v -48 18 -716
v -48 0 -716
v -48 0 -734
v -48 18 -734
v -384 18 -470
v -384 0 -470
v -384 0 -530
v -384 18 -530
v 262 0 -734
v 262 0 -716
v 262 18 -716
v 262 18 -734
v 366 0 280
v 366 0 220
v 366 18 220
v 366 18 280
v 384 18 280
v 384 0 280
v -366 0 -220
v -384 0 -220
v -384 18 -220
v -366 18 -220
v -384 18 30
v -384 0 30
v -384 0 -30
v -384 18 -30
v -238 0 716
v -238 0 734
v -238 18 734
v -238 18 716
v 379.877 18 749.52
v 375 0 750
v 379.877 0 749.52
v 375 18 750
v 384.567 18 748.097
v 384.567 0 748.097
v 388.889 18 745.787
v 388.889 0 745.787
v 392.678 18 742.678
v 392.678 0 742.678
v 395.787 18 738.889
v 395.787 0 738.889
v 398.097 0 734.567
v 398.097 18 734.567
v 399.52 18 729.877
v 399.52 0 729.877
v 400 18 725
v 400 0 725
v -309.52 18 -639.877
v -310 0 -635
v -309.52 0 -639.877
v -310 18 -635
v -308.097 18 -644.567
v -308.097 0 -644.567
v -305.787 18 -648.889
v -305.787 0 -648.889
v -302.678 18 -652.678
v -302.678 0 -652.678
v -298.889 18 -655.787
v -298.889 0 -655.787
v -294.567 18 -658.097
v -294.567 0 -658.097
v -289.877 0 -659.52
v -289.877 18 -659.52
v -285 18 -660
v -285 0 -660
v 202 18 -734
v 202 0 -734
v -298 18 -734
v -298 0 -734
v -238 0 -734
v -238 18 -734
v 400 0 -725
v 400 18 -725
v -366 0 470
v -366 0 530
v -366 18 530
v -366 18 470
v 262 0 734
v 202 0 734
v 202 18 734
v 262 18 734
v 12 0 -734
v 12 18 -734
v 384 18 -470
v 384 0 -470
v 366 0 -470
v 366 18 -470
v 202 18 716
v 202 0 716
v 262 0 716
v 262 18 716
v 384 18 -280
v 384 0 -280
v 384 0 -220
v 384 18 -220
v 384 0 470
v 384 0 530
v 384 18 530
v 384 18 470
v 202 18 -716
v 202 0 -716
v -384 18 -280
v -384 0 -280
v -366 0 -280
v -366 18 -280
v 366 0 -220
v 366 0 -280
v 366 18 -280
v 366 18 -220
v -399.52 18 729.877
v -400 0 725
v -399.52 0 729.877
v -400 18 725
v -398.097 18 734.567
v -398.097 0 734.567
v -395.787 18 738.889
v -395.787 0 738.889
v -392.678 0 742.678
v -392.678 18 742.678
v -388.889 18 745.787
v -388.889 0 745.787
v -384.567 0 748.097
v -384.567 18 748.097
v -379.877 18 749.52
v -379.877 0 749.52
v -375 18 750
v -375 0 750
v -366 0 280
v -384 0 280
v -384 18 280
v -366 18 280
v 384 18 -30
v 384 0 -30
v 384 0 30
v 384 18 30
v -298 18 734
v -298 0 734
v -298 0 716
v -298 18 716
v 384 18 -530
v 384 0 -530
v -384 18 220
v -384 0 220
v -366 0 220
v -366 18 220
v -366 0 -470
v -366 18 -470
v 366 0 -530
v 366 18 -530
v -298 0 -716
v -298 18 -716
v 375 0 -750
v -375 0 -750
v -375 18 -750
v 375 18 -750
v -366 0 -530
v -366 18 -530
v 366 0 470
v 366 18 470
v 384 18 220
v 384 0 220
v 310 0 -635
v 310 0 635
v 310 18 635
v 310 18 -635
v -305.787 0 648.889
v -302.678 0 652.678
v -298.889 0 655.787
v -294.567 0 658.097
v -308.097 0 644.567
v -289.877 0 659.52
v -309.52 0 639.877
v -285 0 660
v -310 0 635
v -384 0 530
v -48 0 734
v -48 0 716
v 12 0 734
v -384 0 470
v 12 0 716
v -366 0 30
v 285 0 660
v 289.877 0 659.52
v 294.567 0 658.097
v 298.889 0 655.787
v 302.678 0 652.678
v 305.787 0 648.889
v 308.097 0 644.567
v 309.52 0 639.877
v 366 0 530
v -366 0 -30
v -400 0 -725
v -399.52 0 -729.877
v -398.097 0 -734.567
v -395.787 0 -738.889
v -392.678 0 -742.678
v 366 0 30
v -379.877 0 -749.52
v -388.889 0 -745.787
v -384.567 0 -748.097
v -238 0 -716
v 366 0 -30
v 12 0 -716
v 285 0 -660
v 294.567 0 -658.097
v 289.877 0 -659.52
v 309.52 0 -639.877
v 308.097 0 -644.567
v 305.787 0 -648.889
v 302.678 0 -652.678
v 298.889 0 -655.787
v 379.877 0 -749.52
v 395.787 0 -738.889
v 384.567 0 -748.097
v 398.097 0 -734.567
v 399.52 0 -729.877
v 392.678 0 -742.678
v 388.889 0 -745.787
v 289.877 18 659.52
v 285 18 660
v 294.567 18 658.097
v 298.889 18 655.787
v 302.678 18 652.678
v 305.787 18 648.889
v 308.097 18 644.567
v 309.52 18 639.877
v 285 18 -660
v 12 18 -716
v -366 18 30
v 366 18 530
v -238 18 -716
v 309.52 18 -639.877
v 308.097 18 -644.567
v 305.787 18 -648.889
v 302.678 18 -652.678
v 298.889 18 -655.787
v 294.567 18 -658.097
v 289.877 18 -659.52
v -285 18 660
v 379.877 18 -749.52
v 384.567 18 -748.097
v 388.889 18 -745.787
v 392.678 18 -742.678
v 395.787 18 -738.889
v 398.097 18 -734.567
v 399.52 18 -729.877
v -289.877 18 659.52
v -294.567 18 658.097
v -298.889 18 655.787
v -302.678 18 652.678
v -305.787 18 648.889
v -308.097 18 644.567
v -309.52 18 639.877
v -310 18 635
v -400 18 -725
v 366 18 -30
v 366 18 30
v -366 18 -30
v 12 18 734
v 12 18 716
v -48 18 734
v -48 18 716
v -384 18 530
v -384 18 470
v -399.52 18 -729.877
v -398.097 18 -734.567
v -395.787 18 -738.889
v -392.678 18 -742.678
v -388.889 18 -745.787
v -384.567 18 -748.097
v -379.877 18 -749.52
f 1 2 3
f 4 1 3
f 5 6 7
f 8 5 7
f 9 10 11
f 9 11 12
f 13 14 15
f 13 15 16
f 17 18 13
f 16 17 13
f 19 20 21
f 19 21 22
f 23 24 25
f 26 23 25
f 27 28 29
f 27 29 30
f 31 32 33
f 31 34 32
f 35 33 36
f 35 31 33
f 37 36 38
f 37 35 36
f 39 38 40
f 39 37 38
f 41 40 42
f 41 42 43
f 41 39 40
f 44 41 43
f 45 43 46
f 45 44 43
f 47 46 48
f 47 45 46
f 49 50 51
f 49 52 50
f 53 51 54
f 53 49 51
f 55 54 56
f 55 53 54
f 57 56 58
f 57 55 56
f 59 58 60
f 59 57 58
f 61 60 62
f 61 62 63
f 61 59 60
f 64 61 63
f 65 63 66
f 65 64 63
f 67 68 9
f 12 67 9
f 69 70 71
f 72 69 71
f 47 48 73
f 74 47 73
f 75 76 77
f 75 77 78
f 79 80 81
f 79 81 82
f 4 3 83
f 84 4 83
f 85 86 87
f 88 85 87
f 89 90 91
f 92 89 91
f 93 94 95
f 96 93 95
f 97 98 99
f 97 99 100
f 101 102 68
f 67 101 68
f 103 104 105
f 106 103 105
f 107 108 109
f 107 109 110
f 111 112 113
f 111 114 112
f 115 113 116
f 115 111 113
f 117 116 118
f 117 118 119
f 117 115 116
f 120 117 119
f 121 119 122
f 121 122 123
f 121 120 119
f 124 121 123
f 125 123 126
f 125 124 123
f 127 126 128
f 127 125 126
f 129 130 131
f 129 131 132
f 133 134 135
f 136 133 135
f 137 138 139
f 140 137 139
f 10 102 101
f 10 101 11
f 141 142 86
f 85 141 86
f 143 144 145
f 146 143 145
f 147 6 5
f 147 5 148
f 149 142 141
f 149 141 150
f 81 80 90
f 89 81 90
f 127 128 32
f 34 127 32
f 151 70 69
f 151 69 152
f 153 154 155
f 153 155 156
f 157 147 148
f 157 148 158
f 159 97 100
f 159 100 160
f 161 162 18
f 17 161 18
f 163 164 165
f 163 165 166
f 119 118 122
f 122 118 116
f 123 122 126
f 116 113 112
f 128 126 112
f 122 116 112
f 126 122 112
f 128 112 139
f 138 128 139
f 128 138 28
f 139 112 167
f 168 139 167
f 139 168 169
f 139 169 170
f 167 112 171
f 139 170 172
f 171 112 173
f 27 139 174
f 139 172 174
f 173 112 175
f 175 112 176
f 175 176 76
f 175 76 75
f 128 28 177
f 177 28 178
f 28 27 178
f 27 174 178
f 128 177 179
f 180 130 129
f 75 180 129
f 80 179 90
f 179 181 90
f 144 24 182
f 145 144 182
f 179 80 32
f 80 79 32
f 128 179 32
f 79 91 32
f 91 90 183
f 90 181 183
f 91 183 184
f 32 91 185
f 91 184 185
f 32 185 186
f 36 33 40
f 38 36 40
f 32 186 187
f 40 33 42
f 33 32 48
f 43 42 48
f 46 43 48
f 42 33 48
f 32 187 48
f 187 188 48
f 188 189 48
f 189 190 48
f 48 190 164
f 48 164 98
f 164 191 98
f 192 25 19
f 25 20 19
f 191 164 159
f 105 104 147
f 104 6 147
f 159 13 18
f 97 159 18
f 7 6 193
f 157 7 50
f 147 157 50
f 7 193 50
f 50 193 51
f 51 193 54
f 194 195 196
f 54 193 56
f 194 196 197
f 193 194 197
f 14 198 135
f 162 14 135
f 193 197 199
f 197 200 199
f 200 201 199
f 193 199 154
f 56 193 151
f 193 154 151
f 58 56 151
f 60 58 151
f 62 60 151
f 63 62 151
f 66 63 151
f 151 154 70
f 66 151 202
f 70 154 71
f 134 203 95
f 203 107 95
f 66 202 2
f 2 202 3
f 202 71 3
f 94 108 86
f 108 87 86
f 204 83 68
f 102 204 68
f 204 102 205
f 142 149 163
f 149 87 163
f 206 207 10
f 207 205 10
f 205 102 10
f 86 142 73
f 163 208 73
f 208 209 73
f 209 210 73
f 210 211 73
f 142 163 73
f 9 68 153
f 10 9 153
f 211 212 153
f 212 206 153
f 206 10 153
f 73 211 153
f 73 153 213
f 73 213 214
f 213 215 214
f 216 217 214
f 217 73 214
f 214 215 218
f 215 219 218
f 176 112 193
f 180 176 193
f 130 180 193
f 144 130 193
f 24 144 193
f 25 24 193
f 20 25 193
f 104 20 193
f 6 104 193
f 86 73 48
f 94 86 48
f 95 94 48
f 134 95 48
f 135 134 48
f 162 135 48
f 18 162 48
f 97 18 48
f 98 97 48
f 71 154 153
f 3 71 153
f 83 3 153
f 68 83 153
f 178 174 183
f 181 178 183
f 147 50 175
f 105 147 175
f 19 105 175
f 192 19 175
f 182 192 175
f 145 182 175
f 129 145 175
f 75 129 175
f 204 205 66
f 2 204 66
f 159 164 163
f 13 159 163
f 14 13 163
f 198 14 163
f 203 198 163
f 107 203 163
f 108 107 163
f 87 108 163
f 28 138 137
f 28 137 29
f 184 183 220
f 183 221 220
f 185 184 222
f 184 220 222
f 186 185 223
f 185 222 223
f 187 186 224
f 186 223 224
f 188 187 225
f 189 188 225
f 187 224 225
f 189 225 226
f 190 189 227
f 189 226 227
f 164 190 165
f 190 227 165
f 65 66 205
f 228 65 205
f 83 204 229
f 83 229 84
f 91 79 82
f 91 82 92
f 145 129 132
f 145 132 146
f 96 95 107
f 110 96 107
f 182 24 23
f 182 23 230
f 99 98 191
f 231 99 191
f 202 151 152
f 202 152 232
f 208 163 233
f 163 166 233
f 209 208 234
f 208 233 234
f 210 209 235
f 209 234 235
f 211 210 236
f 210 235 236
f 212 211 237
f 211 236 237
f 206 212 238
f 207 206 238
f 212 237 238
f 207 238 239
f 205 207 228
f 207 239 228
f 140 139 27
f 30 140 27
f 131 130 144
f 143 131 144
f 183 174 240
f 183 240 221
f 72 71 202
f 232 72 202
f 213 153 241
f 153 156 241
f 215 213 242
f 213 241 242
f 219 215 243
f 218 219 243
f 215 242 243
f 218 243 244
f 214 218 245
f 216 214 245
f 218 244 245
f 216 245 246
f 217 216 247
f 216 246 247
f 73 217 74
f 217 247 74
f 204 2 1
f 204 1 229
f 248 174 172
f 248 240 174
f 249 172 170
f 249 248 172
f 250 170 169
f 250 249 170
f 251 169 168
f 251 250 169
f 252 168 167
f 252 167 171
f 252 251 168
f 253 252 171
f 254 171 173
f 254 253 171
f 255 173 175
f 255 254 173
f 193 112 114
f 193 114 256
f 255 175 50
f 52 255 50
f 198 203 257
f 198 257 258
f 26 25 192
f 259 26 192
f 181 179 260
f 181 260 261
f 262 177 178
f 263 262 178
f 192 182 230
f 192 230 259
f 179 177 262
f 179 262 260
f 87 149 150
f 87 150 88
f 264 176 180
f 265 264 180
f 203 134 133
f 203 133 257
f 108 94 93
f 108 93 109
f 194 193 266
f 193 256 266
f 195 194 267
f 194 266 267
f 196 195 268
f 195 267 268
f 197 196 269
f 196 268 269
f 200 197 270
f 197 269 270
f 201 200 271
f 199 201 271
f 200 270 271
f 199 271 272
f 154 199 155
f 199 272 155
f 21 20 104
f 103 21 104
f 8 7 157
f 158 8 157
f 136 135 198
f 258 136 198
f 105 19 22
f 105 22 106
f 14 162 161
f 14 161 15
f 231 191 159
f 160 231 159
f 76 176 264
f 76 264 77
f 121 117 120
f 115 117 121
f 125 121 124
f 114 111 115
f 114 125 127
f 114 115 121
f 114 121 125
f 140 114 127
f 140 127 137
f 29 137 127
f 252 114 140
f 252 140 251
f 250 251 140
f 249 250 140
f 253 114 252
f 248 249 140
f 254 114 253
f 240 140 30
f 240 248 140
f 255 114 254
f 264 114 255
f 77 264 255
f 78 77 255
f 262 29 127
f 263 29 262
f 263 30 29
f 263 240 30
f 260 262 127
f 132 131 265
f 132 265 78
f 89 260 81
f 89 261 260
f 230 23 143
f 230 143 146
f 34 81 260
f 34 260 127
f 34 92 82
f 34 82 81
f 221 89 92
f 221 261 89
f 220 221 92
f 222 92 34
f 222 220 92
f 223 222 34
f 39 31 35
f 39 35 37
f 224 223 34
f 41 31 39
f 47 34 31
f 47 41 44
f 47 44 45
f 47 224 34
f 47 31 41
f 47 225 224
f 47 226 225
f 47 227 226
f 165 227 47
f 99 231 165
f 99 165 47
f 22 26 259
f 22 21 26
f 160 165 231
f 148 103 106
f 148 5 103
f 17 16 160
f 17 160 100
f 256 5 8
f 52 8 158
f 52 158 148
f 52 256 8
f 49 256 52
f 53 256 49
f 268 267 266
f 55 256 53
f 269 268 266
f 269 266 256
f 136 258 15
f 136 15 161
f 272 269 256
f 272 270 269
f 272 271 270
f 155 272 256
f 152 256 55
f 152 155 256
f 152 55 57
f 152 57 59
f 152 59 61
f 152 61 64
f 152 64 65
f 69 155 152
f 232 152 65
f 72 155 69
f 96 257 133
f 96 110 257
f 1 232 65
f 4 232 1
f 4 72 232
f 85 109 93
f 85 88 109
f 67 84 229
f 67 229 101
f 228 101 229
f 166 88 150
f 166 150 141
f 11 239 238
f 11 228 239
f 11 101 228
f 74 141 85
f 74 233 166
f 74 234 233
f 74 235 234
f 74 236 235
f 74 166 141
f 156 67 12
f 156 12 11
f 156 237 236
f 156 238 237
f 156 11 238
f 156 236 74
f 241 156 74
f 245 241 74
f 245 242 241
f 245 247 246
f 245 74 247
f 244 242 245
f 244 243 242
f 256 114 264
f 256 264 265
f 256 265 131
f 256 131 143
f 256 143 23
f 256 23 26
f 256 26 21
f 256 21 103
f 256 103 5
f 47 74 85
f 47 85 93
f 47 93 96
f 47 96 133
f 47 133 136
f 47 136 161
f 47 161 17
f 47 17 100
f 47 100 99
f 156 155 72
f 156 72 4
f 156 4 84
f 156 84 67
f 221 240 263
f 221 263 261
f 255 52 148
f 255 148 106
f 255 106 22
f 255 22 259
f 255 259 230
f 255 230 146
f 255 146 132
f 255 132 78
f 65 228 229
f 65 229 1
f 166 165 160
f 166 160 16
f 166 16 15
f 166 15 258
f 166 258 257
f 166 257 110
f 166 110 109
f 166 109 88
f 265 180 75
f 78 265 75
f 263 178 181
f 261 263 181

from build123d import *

# Parameters (mm, degrees)
SKETCH_1_W               = 800
SKETCH_1_H               = 1500
SKETCH_1_W_2             = 620
SKETCH_1_H_2             = 1320
EXTRUDE_1_DEPTH          = 18
SKETCH_1_5_W             = 18
SKETCH_1_5_H             = 60
CUT_EXTRUDE_1_DEPTH      = 851.190566873
PATTERN_LINEAR_1_COUNT   = 5
PATTERN_LINEAR_1_PITCH   = 250
MIRROR_1_COPY_1_SKETCH_W = 18
MIRROR_1_COPY_1_SKETCH_H = 60
MIRROR_1_COPY_1_DEPTH    = 851.190566873
MIRROR_1_COPY_2_SKETCH_W = 18
MIRROR_1_COPY_2_SKETCH_H = 60
MIRROR_1_COPY_2_DEPTH    = 851.190566873
MIRROR_1_COPY_3_SKETCH_W = 18
MIRROR_1_COPY_3_SKETCH_H = 60
MIRROR_1_COPY_3_DEPTH    = 851.190566873
MIRROR_1_COPY_4_SKETCH_W = 18
MIRROR_1_COPY_4_SKETCH_H = 60
MIRROR_1_COPY_4_DEPTH    = 851.190566873
SKETCH_1_4_W             = 60
SKETCH_1_4_H             = 18
CUT_EXTRUDE_2_DEPTH      = 851.190566873
PATTERN_LINEAR_2_COUNT   = 3
PATTERN_LINEAR_2_PITCH   = 250
MIRROR_2_COPY_1_SKETCH_W = 60
MIRROR_2_COPY_1_SKETCH_H = 18
MIRROR_2_COPY_1_DEPTH    = 851.190566873
MIRROR_2_COPY_2_SKETCH_W = 60
MIRROR_2_COPY_2_SKETCH_H = 18
MIRROR_2_COPY_2_DEPTH    = 851.190566873
FILLET_1_R               = 25
FILLET_2_R               = 25


with BuildPart() as part:
    # 草图1 → 凸台-拉伸1 (new body)
    with BuildSketch(Plane(origin=(0, 0, 0), x_dir=(1, 0, 0), z_dir=(0, 1, 0))):
        Rectangle(SKETCH_1_W, SKETCH_1_H)
        Rectangle(SKETCH_1_W_2, SKETCH_1_H_2, mode=Mode.SUBTRACT)
    extrude(amount=EXTRUDE_1_DEPTH)

    # 草图1<5> → 切除-拉伸1 (cut, through all)
    with BuildSketch(Plane(origin=(0, 0, 0), x_dir=(1, 0, 0), z_dir=(0, 1, 0))):
        with Locations((-375, -500)):
            Rectangle(SKETCH_1_5_W, SKETCH_1_5_H)
    cut_extrude_1 = extrude(amount=CUT_EXTRUDE_1_DEPTH, mode=Mode.SUBTRACT)

    # 阵列(线性)1: 切除-拉伸1 ×5
    with Locations(*[(0, 0, -i * PATTERN_LINEAR_1_PITCH) for i in range(1, PATTERN_LINEAR_1_COUNT)]):
        add(cut_extrude_1, mode=Mode.SUBTRACT)

    # 镜向1: 切除-拉伸1 across plane
    add(cut_extrude_1.mirror(Plane(origin=(0, 0, 0), x_dir=(0, 0, 1), z_dir=(1, 0, 0))), mode=Mode.SUBTRACT)

    # 镜向1 copy 1 sketch → 镜向1 copy 1 (cut, through all)
    with BuildSketch(Plane(origin=(0, 0, -250), x_dir=(-1, 0, 0), z_dir=(0, 1, 0))):
        with Locations((-375, 500)):
            Rectangle(MIRROR_1_COPY_1_SKETCH_W, MIRROR_1_COPY_1_SKETCH_H)
    extrude(amount=MIRROR_1_COPY_1_DEPTH, mode=Mode.SUBTRACT)

    # 镜向1 copy 2 sketch → 镜向1 copy 2 (cut, through all)
    with BuildSketch(Plane(origin=(0, 0, -500), x_dir=(-1, 0, 0), z_dir=(0, 1, 0))):
        with Locations((-375, 500)):
            Rectangle(MIRROR_1_COPY_2_SKETCH_W, MIRROR_1_COPY_2_SKETCH_H)
    extrude(amount=MIRROR_1_COPY_2_DEPTH, mode=Mode.SUBTRACT)

    # 镜向1 copy 3 sketch → 镜向1 copy 3 (cut, through all)
    with BuildSketch(Plane(origin=(0, 0, -750), x_dir=(-1, 0, 0), z_dir=(0, 1, 0))):
        with Locations((-375, 500)):
            Rectangle(MIRROR_1_COPY_3_SKETCH_W, MIRROR_1_COPY_3_SKETCH_H)
    extrude(amount=MIRROR_1_COPY_3_DEPTH, mode=Mode.SUBTRACT)

    # 镜向1 copy 4 sketch → 镜向1 copy 4 (cut, through all)
    with BuildSketch(Plane(origin=(0, 0, -1000), x_dir=(-1, 0, 0), z_dir=(0, 1, 0))):
        with Locations((-375, 500)):
            Rectangle(MIRROR_1_COPY_4_SKETCH_W, MIRROR_1_COPY_4_SKETCH_H)
    extrude(amount=MIRROR_1_COPY_4_DEPTH, mode=Mode.SUBTRACT)

    # 草图1<4> → 切除-拉伸2 (cut, through all)
    with BuildSketch(Plane(origin=(0, 0, 0), x_dir=(1, 0, 0), z_dir=(0, 1, 0))):
        with Locations((-268, -725)):
            Rectangle(SKETCH_1_4_W, SKETCH_1_4_H)
    cut_extrude_2 = extrude(amount=CUT_EXTRUDE_2_DEPTH, mode=Mode.SUBTRACT)

    # 阵列(线性)2: 切除-拉伸2 ×3
    with Locations(*[(i * PATTERN_LINEAR_2_PITCH, 0, 0) for i in range(1, PATTERN_LINEAR_2_COUNT)]):
        add(cut_extrude_2, mode=Mode.SUBTRACT)

    # 镜向2: 切除-拉伸2 across plane
    add(cut_extrude_2.mirror(Plane.XY), mode=Mode.SUBTRACT)

    # 镜向2 copy 1 sketch → 镜向2 copy 1 (cut, through all)
    with BuildSketch(Plane(origin=(250, 0, 0), x_dir=(1, 0, 0), z_dir=(0, 1, 0))):
        with Locations((-268, 725)):
            Rectangle(MIRROR_2_COPY_1_SKETCH_W, MIRROR_2_COPY_1_SKETCH_H)
    extrude(amount=MIRROR_2_COPY_1_DEPTH, mode=Mode.SUBTRACT)

    # 镜向2 copy 2 sketch → 镜向2 copy 2 (cut, through all)
    with BuildSketch(Plane(origin=(500, 0, 0), x_dir=(1, 0, 0), z_dir=(0, 1, 0))):
        with Locations((-268, 725)):
            Rectangle(MIRROR_2_COPY_2_SKETCH_W, MIRROR_2_COPY_2_SKETCH_H)
    extrude(amount=MIRROR_2_COPY_2_DEPTH, mode=Mode.SUBTRACT)

    # 圆角1
    fillet_1_edges = [part.edges().sort_by_distance(p)[0] for p in [
        (-400, 9, -750),
        (-400, 9, 750),
        (400, 9, 750),
        (400, 9, -750),
    ]]
    fillet(fillet_1_edges, radius=FILLET_1_R)

    # 圆角2
    fillet_2_edges = [part.edges().sort_by_distance(p)[0] for p in [
        (310, 9, -660),
        (-310, 9, -660),
        (-310, 9, 660),
        (310, 9, 660),
    ]]
    fillet(fillet_2_edges, radius=FILLET_2_R)


solid = part.part
